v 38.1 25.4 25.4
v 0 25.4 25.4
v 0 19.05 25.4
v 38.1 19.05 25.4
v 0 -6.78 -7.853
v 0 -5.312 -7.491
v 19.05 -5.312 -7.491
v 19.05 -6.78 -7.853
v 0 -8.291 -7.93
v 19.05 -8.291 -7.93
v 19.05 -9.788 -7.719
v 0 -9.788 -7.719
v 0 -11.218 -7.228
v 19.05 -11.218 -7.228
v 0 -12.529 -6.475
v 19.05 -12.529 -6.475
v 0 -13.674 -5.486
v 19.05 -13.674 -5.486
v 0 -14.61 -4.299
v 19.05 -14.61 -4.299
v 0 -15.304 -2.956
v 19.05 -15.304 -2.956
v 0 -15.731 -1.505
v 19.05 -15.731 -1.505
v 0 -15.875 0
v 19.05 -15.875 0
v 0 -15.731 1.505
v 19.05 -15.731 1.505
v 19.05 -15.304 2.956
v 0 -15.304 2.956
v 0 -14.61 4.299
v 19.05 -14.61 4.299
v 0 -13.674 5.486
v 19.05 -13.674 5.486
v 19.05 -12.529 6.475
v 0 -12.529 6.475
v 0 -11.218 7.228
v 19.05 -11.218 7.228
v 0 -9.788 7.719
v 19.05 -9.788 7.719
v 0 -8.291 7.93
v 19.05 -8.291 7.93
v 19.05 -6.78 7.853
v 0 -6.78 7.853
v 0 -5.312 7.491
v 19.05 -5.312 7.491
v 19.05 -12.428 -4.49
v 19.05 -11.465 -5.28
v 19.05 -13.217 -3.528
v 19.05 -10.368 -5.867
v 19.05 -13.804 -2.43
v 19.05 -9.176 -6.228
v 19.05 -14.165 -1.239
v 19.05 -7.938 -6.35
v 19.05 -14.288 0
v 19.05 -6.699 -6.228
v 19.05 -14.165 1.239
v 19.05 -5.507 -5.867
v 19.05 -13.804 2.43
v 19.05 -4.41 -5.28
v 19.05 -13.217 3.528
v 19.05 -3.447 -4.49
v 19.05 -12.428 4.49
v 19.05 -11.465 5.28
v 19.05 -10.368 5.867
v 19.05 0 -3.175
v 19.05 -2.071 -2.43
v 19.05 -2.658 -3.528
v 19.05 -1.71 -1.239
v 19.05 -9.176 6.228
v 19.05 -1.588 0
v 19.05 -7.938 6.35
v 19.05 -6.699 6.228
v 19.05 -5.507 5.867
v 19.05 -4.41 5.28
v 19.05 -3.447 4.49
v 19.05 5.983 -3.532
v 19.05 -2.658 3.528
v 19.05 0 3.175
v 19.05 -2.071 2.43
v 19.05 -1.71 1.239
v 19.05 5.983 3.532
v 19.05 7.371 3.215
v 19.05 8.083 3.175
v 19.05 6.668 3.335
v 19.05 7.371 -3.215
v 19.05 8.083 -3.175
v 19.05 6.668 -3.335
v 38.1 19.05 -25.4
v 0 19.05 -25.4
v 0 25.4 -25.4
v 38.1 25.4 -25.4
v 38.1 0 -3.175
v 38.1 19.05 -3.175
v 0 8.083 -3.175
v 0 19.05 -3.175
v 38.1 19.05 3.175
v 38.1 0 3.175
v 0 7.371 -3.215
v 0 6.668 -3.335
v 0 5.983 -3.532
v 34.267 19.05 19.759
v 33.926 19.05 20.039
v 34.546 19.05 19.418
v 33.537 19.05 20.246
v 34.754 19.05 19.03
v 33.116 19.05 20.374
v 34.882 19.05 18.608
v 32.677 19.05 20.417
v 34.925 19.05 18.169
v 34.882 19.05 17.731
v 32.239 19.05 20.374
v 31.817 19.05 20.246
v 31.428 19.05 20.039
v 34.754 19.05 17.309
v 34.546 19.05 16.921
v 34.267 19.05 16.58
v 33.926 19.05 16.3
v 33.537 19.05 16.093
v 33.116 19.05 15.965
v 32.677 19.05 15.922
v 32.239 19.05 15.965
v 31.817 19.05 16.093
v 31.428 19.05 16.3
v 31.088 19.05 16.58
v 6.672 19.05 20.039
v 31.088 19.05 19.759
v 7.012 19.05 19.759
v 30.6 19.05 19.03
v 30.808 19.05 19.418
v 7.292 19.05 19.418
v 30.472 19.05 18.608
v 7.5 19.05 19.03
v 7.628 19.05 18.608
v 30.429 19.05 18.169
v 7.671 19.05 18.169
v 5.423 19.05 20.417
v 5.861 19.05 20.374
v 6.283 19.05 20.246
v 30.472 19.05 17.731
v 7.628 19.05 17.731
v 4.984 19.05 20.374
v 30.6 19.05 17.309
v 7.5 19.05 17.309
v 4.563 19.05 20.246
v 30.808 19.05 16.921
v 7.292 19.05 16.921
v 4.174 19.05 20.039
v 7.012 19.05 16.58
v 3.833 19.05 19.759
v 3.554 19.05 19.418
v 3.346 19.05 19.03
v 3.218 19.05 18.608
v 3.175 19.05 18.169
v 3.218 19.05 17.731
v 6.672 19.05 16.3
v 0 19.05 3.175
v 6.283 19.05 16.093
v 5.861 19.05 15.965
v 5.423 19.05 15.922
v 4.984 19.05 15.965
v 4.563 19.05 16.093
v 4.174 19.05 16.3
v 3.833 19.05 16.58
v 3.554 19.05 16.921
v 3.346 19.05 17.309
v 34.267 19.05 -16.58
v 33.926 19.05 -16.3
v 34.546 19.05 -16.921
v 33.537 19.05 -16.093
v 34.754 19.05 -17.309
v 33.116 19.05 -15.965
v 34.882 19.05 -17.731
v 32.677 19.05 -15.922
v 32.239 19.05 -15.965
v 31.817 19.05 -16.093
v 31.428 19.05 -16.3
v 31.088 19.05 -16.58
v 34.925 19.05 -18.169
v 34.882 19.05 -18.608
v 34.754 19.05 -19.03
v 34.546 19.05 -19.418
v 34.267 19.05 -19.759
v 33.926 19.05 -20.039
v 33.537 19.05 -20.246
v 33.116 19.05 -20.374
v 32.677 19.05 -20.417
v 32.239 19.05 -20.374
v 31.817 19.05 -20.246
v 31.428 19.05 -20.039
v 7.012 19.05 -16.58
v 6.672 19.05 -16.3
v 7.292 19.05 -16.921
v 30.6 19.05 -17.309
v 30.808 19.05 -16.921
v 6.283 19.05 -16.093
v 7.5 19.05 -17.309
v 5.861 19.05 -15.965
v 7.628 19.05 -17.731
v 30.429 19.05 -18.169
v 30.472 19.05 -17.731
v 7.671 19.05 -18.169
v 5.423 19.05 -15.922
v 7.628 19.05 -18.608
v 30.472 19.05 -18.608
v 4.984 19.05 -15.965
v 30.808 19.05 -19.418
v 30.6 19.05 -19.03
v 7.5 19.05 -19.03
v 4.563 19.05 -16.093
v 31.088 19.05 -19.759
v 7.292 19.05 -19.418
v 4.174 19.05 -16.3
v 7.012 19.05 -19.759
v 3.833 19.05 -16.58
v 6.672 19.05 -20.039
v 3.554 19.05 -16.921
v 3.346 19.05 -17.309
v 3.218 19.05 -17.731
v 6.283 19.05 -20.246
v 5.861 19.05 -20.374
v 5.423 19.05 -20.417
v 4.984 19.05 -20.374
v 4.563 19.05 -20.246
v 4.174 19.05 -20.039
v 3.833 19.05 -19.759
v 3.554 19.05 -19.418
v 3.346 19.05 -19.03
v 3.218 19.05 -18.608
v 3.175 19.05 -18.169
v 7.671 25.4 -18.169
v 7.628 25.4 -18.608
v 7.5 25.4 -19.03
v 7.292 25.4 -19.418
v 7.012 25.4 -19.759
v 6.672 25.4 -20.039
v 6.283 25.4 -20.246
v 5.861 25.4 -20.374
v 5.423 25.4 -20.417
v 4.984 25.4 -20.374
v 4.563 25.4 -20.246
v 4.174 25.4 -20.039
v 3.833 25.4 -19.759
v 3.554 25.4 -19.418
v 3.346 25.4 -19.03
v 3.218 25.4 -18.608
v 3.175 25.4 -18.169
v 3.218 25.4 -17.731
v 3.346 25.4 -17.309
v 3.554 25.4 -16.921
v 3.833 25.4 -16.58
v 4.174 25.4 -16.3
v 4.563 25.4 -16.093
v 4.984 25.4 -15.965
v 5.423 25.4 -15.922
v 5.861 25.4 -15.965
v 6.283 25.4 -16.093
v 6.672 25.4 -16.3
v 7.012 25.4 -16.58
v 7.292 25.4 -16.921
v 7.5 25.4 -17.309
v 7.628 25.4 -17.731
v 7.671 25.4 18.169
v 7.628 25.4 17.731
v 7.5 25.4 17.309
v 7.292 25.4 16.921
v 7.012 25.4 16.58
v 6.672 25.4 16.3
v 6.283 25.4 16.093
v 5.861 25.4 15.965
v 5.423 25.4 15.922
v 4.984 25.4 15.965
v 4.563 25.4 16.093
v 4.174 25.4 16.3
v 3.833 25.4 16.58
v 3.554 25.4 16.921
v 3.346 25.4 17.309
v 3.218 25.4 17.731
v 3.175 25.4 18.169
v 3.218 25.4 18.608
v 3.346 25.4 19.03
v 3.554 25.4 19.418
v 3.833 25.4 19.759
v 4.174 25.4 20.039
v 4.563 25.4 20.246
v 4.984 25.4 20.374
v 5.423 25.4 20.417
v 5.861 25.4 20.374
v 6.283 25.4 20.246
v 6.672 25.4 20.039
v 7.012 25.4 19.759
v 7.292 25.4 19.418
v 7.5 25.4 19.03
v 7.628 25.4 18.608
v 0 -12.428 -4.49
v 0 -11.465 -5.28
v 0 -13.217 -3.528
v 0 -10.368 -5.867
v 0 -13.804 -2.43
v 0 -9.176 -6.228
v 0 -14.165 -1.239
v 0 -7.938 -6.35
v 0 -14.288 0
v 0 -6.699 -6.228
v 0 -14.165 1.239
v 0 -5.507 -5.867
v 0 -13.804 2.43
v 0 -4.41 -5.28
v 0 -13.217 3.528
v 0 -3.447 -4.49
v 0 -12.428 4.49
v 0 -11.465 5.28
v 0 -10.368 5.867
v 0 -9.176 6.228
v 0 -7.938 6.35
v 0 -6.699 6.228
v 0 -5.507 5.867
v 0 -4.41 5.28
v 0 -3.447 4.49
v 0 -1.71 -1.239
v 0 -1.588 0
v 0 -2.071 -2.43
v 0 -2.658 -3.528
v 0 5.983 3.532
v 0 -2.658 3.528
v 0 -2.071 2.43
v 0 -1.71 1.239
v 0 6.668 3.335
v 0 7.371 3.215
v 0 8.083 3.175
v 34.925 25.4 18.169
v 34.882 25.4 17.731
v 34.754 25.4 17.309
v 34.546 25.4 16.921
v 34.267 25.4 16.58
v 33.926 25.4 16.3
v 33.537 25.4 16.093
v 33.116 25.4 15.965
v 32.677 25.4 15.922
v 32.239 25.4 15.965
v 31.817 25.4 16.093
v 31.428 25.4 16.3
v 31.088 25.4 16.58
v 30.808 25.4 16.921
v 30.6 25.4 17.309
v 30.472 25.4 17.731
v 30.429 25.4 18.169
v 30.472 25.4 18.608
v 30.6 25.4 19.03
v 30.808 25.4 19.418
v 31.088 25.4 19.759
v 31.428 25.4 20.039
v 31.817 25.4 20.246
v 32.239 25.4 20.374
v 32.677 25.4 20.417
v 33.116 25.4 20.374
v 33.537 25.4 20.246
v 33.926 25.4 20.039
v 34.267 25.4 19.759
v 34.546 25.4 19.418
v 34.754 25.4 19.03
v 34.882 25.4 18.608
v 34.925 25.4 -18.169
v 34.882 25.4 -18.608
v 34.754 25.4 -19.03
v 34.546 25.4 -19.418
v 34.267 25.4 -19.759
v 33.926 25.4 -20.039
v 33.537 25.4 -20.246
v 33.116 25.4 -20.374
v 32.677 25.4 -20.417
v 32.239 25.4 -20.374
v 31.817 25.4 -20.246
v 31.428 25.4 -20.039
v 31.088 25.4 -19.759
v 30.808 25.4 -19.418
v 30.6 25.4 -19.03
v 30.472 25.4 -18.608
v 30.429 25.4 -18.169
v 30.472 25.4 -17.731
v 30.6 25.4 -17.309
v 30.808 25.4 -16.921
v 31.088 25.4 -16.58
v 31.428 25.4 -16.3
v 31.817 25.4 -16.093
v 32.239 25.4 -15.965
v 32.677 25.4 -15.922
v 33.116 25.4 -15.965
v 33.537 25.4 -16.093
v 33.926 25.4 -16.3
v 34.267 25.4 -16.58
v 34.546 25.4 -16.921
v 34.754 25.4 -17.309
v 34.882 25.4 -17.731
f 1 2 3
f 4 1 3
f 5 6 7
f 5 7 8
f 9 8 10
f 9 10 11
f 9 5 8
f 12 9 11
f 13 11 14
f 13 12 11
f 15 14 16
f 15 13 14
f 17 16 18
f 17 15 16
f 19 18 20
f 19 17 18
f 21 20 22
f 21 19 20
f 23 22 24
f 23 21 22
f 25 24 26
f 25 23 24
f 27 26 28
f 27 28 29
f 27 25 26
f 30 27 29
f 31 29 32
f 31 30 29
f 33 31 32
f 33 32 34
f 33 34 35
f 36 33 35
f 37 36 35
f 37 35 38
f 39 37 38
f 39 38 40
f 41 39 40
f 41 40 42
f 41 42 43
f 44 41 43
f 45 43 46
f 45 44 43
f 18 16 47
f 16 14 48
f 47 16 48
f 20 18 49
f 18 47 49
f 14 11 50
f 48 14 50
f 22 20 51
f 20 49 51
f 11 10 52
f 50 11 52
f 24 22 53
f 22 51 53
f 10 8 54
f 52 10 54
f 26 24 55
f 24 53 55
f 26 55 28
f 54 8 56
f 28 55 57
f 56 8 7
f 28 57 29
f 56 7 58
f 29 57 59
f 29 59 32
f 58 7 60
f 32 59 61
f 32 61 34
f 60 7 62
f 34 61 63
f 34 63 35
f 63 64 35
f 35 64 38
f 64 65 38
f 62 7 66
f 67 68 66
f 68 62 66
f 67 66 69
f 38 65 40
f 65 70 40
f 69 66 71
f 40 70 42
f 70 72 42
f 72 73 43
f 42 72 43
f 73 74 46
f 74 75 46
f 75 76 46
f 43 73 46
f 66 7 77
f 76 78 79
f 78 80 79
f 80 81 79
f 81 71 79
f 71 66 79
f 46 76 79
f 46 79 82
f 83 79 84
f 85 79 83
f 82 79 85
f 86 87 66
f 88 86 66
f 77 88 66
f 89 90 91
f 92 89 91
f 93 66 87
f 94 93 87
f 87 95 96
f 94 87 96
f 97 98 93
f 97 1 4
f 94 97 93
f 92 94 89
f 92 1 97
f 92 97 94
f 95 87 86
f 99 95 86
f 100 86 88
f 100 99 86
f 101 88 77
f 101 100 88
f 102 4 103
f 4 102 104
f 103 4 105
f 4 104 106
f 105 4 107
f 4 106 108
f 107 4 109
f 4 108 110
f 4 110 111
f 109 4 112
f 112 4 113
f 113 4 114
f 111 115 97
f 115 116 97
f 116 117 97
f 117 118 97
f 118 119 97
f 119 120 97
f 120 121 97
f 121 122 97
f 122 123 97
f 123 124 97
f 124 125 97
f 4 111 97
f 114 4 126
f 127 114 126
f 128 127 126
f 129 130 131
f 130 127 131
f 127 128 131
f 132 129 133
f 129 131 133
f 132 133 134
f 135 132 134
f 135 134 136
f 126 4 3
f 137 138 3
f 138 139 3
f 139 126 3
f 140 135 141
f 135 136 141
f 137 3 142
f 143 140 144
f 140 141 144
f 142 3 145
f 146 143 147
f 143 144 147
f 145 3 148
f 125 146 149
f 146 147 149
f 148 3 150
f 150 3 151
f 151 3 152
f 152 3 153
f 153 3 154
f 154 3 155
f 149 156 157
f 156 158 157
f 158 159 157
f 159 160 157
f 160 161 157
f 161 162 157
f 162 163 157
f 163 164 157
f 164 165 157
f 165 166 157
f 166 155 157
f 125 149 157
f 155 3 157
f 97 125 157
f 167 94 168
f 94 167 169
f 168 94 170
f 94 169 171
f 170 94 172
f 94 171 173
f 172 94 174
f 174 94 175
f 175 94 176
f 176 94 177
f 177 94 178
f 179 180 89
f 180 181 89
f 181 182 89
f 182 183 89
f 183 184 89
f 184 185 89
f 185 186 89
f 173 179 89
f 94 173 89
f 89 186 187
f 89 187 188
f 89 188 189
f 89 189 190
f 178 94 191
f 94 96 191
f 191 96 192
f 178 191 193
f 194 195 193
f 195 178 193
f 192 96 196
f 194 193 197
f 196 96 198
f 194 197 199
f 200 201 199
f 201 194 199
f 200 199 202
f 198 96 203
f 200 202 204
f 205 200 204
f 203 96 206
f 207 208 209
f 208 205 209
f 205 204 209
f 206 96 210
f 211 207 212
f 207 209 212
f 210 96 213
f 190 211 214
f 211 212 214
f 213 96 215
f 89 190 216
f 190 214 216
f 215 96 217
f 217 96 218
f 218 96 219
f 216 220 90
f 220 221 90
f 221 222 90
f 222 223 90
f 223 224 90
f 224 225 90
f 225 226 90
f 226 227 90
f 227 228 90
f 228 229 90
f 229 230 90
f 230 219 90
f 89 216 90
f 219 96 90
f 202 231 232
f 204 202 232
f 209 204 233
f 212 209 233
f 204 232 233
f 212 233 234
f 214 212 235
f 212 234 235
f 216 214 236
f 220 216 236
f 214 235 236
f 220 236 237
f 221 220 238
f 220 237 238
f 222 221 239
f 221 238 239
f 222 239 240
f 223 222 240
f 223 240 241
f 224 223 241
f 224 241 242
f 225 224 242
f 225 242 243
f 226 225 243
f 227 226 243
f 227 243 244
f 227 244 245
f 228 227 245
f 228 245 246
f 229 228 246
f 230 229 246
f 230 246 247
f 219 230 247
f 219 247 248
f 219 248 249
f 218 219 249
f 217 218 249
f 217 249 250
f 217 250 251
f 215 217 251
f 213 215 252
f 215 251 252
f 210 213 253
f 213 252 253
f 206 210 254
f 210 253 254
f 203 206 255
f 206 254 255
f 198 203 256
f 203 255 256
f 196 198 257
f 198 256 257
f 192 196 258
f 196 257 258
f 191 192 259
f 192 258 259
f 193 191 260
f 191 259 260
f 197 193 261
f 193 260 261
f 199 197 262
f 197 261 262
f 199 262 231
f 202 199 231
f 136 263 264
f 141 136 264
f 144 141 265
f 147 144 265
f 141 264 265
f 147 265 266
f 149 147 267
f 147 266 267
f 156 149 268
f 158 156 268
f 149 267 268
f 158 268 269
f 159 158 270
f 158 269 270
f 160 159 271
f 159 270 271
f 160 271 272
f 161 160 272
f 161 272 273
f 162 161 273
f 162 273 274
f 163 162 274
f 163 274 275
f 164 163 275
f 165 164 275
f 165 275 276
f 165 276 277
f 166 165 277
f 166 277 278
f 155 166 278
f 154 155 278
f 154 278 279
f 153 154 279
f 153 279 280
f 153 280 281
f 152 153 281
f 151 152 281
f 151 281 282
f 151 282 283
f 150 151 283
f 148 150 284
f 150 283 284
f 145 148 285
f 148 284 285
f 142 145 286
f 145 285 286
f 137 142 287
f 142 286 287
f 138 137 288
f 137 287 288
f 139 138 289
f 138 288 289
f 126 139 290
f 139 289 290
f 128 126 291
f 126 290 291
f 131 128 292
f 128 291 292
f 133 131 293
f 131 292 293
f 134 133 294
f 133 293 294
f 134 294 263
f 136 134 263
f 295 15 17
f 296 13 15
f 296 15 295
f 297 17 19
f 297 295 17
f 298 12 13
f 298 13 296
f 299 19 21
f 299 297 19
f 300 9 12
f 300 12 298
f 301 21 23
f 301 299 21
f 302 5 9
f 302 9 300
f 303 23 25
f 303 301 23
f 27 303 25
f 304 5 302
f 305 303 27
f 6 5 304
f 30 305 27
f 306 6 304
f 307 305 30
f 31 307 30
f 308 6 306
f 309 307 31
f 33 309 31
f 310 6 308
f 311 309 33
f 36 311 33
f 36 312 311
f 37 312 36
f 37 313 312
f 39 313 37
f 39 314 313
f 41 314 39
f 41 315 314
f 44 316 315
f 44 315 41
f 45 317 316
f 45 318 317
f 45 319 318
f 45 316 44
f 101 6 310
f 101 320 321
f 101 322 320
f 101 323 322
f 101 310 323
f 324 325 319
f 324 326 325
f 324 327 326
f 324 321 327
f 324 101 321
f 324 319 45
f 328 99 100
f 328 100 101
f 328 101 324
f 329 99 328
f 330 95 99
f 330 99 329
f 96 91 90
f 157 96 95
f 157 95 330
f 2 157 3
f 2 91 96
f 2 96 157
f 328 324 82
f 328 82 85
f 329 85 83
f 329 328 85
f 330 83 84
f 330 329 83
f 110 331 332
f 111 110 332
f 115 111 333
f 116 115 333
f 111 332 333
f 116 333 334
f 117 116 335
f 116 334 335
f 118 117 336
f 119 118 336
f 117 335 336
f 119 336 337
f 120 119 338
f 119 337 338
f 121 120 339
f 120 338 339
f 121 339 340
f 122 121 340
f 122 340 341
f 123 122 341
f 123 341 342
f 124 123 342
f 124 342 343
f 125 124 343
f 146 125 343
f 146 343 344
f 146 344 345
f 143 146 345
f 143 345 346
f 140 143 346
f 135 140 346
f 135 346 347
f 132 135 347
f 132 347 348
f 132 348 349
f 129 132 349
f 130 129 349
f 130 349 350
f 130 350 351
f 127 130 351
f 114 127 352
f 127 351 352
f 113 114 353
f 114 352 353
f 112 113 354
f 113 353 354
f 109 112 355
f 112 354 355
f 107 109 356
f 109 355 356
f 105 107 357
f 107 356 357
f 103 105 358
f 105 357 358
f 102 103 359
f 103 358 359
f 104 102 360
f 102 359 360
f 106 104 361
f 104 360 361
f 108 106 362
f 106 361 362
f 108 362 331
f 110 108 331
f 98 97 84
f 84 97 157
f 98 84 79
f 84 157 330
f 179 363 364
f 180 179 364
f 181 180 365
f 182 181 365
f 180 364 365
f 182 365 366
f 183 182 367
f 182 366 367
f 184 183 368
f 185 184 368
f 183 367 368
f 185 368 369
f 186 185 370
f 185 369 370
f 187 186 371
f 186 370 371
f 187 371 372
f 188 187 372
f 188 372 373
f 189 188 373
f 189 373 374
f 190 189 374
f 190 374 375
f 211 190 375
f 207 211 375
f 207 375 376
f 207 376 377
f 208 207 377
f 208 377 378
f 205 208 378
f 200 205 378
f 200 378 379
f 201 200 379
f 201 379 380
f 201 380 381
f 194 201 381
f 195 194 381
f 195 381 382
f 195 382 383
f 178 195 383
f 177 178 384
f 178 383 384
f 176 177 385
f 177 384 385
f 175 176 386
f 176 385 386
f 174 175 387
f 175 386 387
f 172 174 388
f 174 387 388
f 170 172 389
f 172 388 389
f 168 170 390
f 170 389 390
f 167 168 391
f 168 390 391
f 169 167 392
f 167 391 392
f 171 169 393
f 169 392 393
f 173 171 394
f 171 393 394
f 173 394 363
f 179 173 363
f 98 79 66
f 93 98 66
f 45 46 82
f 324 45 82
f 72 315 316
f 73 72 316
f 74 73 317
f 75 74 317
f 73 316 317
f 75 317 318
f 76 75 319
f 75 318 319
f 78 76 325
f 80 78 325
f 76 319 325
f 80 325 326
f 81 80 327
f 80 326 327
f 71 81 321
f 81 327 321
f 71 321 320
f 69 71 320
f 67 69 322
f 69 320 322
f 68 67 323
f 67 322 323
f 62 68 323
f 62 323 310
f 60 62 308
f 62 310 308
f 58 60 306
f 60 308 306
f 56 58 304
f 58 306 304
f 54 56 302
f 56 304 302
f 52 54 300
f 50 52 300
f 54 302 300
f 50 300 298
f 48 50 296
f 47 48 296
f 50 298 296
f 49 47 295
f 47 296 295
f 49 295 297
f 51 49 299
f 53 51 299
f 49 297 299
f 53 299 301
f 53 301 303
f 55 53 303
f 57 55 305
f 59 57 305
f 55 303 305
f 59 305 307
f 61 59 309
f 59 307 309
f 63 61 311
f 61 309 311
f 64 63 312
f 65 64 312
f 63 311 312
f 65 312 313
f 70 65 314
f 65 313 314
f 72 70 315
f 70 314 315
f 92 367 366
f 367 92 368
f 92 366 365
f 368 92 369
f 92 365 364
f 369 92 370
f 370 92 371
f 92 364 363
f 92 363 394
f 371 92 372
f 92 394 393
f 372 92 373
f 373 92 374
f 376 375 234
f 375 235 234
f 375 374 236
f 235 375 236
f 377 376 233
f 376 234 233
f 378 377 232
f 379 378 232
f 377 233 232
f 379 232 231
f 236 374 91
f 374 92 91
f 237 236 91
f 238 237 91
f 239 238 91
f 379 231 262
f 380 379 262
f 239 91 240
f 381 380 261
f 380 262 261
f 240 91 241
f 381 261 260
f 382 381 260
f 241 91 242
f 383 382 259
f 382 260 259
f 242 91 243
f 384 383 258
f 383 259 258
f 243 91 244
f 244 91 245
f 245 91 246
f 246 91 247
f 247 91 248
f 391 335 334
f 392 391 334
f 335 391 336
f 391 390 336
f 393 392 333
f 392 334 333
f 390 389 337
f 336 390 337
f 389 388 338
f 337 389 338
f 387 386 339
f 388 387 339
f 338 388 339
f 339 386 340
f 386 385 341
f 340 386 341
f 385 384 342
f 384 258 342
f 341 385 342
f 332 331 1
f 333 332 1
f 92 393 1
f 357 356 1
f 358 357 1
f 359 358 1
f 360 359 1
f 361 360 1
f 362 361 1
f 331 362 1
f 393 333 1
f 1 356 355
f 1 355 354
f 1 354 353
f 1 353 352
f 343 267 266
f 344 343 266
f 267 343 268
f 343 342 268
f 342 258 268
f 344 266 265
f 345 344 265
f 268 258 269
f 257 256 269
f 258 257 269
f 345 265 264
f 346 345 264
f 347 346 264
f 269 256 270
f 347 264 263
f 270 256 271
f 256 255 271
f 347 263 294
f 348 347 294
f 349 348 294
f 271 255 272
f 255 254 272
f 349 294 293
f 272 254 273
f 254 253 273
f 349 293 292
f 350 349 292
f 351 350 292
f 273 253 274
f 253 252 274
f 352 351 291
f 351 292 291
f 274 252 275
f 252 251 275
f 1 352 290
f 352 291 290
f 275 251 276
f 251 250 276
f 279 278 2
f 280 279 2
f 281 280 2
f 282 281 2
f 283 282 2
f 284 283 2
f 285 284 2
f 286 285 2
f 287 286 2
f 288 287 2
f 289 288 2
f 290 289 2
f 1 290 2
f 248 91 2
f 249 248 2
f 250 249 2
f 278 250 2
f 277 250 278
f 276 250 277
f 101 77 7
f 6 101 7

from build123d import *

# Parameters (mm, degrees)
BOSS_EXTRUDE1_DEPTH = 38.1
SKETCH2_R           = 6.35
BOSS_EXTRUDE2_DEPTH = 19.05
SKETCH3_R           = 2.2479
CUT_EXTRUDE1_DEPTH  = 42.275


with BuildPart() as part:
    # Sketch1 → Boss-Extrude1 (new body)
    with BuildSketch(Plane(origin=(0, 0, 0), x_dir=(0, 0, -1), z_dir=(1, 0, 0))):
        Polygon((-3.175, 0), (3.175, 0), (3.175, 19.05), (25.4, 19.05), (25.4, 25.4), (-25.4, 25.4), (-25.4, 19.05), (-3.175, 19.05), align=None)
    extrude(amount=BOSS_EXTRUDE1_DEPTH)

    # Sketch2 → Boss-Extrude2 (add)
    with BuildSketch(Plane.ZY):
        with BuildLine():
            ThreePointArc((-7.490824128, -5.312340931), (0, -15.875), (7.490824128, -5.312340931))
            Line((7.490824128, -5.312340931), (3.532340698, 5.983090093))
            ThreePointArc((3.532340698, 5.983090093), (3.264972581, 7.018061624), (3.175, 8.083217348))
            Line((3.175, 8.083217348), (3.175, 7.002752616))
            Line((3.175, 7.002752616), (3.175, 0))
            Line((3.175, 0), (-3.175, 0))
            Line((-3.175, 0), (-3.175, 7.002752616))
            Line((-3.175, 7.002752616), (-3.175, 8.083217348))
            ThreePointArc((-3.175, 8.083217348), (-3.264972581, 7.018061624), (-3.532340698, 5.983090093))
            Line((-3.532340698, 5.983090093), (-7.490824128, -5.312340931))
        make_face()
        with Locations((0, -7.9375)):
            Circle(SKETCH2_R, mode=Mode.SUBTRACT)
    extrude(amount=-BOSS_EXTRUDE2_DEPTH)

    # Sketch3 → Cut-Extrude1 (cut, through all)
    with BuildSketch(Plane(origin=(0, 25.4, 0), x_dir=(1, 0, 0), z_dir=(0, 1, 0))):
        with Locations((5.4229, 18.169466667)):
            Circle(SKETCH3_R)
        with Locations((32.6771, 18.169466667)):
            Circle(SKETCH3_R)
        with Locations((32.6771, -18.169466667)):
            Circle(SKETCH3_R)
        with Locations((5.4229, -18.169466667)):
            Circle(SKETCH3_R)
    extrude(amount=-CUT_EXTRUDE1_DEPTH, mode=Mode.SUBTRACT)


solid = part.part
